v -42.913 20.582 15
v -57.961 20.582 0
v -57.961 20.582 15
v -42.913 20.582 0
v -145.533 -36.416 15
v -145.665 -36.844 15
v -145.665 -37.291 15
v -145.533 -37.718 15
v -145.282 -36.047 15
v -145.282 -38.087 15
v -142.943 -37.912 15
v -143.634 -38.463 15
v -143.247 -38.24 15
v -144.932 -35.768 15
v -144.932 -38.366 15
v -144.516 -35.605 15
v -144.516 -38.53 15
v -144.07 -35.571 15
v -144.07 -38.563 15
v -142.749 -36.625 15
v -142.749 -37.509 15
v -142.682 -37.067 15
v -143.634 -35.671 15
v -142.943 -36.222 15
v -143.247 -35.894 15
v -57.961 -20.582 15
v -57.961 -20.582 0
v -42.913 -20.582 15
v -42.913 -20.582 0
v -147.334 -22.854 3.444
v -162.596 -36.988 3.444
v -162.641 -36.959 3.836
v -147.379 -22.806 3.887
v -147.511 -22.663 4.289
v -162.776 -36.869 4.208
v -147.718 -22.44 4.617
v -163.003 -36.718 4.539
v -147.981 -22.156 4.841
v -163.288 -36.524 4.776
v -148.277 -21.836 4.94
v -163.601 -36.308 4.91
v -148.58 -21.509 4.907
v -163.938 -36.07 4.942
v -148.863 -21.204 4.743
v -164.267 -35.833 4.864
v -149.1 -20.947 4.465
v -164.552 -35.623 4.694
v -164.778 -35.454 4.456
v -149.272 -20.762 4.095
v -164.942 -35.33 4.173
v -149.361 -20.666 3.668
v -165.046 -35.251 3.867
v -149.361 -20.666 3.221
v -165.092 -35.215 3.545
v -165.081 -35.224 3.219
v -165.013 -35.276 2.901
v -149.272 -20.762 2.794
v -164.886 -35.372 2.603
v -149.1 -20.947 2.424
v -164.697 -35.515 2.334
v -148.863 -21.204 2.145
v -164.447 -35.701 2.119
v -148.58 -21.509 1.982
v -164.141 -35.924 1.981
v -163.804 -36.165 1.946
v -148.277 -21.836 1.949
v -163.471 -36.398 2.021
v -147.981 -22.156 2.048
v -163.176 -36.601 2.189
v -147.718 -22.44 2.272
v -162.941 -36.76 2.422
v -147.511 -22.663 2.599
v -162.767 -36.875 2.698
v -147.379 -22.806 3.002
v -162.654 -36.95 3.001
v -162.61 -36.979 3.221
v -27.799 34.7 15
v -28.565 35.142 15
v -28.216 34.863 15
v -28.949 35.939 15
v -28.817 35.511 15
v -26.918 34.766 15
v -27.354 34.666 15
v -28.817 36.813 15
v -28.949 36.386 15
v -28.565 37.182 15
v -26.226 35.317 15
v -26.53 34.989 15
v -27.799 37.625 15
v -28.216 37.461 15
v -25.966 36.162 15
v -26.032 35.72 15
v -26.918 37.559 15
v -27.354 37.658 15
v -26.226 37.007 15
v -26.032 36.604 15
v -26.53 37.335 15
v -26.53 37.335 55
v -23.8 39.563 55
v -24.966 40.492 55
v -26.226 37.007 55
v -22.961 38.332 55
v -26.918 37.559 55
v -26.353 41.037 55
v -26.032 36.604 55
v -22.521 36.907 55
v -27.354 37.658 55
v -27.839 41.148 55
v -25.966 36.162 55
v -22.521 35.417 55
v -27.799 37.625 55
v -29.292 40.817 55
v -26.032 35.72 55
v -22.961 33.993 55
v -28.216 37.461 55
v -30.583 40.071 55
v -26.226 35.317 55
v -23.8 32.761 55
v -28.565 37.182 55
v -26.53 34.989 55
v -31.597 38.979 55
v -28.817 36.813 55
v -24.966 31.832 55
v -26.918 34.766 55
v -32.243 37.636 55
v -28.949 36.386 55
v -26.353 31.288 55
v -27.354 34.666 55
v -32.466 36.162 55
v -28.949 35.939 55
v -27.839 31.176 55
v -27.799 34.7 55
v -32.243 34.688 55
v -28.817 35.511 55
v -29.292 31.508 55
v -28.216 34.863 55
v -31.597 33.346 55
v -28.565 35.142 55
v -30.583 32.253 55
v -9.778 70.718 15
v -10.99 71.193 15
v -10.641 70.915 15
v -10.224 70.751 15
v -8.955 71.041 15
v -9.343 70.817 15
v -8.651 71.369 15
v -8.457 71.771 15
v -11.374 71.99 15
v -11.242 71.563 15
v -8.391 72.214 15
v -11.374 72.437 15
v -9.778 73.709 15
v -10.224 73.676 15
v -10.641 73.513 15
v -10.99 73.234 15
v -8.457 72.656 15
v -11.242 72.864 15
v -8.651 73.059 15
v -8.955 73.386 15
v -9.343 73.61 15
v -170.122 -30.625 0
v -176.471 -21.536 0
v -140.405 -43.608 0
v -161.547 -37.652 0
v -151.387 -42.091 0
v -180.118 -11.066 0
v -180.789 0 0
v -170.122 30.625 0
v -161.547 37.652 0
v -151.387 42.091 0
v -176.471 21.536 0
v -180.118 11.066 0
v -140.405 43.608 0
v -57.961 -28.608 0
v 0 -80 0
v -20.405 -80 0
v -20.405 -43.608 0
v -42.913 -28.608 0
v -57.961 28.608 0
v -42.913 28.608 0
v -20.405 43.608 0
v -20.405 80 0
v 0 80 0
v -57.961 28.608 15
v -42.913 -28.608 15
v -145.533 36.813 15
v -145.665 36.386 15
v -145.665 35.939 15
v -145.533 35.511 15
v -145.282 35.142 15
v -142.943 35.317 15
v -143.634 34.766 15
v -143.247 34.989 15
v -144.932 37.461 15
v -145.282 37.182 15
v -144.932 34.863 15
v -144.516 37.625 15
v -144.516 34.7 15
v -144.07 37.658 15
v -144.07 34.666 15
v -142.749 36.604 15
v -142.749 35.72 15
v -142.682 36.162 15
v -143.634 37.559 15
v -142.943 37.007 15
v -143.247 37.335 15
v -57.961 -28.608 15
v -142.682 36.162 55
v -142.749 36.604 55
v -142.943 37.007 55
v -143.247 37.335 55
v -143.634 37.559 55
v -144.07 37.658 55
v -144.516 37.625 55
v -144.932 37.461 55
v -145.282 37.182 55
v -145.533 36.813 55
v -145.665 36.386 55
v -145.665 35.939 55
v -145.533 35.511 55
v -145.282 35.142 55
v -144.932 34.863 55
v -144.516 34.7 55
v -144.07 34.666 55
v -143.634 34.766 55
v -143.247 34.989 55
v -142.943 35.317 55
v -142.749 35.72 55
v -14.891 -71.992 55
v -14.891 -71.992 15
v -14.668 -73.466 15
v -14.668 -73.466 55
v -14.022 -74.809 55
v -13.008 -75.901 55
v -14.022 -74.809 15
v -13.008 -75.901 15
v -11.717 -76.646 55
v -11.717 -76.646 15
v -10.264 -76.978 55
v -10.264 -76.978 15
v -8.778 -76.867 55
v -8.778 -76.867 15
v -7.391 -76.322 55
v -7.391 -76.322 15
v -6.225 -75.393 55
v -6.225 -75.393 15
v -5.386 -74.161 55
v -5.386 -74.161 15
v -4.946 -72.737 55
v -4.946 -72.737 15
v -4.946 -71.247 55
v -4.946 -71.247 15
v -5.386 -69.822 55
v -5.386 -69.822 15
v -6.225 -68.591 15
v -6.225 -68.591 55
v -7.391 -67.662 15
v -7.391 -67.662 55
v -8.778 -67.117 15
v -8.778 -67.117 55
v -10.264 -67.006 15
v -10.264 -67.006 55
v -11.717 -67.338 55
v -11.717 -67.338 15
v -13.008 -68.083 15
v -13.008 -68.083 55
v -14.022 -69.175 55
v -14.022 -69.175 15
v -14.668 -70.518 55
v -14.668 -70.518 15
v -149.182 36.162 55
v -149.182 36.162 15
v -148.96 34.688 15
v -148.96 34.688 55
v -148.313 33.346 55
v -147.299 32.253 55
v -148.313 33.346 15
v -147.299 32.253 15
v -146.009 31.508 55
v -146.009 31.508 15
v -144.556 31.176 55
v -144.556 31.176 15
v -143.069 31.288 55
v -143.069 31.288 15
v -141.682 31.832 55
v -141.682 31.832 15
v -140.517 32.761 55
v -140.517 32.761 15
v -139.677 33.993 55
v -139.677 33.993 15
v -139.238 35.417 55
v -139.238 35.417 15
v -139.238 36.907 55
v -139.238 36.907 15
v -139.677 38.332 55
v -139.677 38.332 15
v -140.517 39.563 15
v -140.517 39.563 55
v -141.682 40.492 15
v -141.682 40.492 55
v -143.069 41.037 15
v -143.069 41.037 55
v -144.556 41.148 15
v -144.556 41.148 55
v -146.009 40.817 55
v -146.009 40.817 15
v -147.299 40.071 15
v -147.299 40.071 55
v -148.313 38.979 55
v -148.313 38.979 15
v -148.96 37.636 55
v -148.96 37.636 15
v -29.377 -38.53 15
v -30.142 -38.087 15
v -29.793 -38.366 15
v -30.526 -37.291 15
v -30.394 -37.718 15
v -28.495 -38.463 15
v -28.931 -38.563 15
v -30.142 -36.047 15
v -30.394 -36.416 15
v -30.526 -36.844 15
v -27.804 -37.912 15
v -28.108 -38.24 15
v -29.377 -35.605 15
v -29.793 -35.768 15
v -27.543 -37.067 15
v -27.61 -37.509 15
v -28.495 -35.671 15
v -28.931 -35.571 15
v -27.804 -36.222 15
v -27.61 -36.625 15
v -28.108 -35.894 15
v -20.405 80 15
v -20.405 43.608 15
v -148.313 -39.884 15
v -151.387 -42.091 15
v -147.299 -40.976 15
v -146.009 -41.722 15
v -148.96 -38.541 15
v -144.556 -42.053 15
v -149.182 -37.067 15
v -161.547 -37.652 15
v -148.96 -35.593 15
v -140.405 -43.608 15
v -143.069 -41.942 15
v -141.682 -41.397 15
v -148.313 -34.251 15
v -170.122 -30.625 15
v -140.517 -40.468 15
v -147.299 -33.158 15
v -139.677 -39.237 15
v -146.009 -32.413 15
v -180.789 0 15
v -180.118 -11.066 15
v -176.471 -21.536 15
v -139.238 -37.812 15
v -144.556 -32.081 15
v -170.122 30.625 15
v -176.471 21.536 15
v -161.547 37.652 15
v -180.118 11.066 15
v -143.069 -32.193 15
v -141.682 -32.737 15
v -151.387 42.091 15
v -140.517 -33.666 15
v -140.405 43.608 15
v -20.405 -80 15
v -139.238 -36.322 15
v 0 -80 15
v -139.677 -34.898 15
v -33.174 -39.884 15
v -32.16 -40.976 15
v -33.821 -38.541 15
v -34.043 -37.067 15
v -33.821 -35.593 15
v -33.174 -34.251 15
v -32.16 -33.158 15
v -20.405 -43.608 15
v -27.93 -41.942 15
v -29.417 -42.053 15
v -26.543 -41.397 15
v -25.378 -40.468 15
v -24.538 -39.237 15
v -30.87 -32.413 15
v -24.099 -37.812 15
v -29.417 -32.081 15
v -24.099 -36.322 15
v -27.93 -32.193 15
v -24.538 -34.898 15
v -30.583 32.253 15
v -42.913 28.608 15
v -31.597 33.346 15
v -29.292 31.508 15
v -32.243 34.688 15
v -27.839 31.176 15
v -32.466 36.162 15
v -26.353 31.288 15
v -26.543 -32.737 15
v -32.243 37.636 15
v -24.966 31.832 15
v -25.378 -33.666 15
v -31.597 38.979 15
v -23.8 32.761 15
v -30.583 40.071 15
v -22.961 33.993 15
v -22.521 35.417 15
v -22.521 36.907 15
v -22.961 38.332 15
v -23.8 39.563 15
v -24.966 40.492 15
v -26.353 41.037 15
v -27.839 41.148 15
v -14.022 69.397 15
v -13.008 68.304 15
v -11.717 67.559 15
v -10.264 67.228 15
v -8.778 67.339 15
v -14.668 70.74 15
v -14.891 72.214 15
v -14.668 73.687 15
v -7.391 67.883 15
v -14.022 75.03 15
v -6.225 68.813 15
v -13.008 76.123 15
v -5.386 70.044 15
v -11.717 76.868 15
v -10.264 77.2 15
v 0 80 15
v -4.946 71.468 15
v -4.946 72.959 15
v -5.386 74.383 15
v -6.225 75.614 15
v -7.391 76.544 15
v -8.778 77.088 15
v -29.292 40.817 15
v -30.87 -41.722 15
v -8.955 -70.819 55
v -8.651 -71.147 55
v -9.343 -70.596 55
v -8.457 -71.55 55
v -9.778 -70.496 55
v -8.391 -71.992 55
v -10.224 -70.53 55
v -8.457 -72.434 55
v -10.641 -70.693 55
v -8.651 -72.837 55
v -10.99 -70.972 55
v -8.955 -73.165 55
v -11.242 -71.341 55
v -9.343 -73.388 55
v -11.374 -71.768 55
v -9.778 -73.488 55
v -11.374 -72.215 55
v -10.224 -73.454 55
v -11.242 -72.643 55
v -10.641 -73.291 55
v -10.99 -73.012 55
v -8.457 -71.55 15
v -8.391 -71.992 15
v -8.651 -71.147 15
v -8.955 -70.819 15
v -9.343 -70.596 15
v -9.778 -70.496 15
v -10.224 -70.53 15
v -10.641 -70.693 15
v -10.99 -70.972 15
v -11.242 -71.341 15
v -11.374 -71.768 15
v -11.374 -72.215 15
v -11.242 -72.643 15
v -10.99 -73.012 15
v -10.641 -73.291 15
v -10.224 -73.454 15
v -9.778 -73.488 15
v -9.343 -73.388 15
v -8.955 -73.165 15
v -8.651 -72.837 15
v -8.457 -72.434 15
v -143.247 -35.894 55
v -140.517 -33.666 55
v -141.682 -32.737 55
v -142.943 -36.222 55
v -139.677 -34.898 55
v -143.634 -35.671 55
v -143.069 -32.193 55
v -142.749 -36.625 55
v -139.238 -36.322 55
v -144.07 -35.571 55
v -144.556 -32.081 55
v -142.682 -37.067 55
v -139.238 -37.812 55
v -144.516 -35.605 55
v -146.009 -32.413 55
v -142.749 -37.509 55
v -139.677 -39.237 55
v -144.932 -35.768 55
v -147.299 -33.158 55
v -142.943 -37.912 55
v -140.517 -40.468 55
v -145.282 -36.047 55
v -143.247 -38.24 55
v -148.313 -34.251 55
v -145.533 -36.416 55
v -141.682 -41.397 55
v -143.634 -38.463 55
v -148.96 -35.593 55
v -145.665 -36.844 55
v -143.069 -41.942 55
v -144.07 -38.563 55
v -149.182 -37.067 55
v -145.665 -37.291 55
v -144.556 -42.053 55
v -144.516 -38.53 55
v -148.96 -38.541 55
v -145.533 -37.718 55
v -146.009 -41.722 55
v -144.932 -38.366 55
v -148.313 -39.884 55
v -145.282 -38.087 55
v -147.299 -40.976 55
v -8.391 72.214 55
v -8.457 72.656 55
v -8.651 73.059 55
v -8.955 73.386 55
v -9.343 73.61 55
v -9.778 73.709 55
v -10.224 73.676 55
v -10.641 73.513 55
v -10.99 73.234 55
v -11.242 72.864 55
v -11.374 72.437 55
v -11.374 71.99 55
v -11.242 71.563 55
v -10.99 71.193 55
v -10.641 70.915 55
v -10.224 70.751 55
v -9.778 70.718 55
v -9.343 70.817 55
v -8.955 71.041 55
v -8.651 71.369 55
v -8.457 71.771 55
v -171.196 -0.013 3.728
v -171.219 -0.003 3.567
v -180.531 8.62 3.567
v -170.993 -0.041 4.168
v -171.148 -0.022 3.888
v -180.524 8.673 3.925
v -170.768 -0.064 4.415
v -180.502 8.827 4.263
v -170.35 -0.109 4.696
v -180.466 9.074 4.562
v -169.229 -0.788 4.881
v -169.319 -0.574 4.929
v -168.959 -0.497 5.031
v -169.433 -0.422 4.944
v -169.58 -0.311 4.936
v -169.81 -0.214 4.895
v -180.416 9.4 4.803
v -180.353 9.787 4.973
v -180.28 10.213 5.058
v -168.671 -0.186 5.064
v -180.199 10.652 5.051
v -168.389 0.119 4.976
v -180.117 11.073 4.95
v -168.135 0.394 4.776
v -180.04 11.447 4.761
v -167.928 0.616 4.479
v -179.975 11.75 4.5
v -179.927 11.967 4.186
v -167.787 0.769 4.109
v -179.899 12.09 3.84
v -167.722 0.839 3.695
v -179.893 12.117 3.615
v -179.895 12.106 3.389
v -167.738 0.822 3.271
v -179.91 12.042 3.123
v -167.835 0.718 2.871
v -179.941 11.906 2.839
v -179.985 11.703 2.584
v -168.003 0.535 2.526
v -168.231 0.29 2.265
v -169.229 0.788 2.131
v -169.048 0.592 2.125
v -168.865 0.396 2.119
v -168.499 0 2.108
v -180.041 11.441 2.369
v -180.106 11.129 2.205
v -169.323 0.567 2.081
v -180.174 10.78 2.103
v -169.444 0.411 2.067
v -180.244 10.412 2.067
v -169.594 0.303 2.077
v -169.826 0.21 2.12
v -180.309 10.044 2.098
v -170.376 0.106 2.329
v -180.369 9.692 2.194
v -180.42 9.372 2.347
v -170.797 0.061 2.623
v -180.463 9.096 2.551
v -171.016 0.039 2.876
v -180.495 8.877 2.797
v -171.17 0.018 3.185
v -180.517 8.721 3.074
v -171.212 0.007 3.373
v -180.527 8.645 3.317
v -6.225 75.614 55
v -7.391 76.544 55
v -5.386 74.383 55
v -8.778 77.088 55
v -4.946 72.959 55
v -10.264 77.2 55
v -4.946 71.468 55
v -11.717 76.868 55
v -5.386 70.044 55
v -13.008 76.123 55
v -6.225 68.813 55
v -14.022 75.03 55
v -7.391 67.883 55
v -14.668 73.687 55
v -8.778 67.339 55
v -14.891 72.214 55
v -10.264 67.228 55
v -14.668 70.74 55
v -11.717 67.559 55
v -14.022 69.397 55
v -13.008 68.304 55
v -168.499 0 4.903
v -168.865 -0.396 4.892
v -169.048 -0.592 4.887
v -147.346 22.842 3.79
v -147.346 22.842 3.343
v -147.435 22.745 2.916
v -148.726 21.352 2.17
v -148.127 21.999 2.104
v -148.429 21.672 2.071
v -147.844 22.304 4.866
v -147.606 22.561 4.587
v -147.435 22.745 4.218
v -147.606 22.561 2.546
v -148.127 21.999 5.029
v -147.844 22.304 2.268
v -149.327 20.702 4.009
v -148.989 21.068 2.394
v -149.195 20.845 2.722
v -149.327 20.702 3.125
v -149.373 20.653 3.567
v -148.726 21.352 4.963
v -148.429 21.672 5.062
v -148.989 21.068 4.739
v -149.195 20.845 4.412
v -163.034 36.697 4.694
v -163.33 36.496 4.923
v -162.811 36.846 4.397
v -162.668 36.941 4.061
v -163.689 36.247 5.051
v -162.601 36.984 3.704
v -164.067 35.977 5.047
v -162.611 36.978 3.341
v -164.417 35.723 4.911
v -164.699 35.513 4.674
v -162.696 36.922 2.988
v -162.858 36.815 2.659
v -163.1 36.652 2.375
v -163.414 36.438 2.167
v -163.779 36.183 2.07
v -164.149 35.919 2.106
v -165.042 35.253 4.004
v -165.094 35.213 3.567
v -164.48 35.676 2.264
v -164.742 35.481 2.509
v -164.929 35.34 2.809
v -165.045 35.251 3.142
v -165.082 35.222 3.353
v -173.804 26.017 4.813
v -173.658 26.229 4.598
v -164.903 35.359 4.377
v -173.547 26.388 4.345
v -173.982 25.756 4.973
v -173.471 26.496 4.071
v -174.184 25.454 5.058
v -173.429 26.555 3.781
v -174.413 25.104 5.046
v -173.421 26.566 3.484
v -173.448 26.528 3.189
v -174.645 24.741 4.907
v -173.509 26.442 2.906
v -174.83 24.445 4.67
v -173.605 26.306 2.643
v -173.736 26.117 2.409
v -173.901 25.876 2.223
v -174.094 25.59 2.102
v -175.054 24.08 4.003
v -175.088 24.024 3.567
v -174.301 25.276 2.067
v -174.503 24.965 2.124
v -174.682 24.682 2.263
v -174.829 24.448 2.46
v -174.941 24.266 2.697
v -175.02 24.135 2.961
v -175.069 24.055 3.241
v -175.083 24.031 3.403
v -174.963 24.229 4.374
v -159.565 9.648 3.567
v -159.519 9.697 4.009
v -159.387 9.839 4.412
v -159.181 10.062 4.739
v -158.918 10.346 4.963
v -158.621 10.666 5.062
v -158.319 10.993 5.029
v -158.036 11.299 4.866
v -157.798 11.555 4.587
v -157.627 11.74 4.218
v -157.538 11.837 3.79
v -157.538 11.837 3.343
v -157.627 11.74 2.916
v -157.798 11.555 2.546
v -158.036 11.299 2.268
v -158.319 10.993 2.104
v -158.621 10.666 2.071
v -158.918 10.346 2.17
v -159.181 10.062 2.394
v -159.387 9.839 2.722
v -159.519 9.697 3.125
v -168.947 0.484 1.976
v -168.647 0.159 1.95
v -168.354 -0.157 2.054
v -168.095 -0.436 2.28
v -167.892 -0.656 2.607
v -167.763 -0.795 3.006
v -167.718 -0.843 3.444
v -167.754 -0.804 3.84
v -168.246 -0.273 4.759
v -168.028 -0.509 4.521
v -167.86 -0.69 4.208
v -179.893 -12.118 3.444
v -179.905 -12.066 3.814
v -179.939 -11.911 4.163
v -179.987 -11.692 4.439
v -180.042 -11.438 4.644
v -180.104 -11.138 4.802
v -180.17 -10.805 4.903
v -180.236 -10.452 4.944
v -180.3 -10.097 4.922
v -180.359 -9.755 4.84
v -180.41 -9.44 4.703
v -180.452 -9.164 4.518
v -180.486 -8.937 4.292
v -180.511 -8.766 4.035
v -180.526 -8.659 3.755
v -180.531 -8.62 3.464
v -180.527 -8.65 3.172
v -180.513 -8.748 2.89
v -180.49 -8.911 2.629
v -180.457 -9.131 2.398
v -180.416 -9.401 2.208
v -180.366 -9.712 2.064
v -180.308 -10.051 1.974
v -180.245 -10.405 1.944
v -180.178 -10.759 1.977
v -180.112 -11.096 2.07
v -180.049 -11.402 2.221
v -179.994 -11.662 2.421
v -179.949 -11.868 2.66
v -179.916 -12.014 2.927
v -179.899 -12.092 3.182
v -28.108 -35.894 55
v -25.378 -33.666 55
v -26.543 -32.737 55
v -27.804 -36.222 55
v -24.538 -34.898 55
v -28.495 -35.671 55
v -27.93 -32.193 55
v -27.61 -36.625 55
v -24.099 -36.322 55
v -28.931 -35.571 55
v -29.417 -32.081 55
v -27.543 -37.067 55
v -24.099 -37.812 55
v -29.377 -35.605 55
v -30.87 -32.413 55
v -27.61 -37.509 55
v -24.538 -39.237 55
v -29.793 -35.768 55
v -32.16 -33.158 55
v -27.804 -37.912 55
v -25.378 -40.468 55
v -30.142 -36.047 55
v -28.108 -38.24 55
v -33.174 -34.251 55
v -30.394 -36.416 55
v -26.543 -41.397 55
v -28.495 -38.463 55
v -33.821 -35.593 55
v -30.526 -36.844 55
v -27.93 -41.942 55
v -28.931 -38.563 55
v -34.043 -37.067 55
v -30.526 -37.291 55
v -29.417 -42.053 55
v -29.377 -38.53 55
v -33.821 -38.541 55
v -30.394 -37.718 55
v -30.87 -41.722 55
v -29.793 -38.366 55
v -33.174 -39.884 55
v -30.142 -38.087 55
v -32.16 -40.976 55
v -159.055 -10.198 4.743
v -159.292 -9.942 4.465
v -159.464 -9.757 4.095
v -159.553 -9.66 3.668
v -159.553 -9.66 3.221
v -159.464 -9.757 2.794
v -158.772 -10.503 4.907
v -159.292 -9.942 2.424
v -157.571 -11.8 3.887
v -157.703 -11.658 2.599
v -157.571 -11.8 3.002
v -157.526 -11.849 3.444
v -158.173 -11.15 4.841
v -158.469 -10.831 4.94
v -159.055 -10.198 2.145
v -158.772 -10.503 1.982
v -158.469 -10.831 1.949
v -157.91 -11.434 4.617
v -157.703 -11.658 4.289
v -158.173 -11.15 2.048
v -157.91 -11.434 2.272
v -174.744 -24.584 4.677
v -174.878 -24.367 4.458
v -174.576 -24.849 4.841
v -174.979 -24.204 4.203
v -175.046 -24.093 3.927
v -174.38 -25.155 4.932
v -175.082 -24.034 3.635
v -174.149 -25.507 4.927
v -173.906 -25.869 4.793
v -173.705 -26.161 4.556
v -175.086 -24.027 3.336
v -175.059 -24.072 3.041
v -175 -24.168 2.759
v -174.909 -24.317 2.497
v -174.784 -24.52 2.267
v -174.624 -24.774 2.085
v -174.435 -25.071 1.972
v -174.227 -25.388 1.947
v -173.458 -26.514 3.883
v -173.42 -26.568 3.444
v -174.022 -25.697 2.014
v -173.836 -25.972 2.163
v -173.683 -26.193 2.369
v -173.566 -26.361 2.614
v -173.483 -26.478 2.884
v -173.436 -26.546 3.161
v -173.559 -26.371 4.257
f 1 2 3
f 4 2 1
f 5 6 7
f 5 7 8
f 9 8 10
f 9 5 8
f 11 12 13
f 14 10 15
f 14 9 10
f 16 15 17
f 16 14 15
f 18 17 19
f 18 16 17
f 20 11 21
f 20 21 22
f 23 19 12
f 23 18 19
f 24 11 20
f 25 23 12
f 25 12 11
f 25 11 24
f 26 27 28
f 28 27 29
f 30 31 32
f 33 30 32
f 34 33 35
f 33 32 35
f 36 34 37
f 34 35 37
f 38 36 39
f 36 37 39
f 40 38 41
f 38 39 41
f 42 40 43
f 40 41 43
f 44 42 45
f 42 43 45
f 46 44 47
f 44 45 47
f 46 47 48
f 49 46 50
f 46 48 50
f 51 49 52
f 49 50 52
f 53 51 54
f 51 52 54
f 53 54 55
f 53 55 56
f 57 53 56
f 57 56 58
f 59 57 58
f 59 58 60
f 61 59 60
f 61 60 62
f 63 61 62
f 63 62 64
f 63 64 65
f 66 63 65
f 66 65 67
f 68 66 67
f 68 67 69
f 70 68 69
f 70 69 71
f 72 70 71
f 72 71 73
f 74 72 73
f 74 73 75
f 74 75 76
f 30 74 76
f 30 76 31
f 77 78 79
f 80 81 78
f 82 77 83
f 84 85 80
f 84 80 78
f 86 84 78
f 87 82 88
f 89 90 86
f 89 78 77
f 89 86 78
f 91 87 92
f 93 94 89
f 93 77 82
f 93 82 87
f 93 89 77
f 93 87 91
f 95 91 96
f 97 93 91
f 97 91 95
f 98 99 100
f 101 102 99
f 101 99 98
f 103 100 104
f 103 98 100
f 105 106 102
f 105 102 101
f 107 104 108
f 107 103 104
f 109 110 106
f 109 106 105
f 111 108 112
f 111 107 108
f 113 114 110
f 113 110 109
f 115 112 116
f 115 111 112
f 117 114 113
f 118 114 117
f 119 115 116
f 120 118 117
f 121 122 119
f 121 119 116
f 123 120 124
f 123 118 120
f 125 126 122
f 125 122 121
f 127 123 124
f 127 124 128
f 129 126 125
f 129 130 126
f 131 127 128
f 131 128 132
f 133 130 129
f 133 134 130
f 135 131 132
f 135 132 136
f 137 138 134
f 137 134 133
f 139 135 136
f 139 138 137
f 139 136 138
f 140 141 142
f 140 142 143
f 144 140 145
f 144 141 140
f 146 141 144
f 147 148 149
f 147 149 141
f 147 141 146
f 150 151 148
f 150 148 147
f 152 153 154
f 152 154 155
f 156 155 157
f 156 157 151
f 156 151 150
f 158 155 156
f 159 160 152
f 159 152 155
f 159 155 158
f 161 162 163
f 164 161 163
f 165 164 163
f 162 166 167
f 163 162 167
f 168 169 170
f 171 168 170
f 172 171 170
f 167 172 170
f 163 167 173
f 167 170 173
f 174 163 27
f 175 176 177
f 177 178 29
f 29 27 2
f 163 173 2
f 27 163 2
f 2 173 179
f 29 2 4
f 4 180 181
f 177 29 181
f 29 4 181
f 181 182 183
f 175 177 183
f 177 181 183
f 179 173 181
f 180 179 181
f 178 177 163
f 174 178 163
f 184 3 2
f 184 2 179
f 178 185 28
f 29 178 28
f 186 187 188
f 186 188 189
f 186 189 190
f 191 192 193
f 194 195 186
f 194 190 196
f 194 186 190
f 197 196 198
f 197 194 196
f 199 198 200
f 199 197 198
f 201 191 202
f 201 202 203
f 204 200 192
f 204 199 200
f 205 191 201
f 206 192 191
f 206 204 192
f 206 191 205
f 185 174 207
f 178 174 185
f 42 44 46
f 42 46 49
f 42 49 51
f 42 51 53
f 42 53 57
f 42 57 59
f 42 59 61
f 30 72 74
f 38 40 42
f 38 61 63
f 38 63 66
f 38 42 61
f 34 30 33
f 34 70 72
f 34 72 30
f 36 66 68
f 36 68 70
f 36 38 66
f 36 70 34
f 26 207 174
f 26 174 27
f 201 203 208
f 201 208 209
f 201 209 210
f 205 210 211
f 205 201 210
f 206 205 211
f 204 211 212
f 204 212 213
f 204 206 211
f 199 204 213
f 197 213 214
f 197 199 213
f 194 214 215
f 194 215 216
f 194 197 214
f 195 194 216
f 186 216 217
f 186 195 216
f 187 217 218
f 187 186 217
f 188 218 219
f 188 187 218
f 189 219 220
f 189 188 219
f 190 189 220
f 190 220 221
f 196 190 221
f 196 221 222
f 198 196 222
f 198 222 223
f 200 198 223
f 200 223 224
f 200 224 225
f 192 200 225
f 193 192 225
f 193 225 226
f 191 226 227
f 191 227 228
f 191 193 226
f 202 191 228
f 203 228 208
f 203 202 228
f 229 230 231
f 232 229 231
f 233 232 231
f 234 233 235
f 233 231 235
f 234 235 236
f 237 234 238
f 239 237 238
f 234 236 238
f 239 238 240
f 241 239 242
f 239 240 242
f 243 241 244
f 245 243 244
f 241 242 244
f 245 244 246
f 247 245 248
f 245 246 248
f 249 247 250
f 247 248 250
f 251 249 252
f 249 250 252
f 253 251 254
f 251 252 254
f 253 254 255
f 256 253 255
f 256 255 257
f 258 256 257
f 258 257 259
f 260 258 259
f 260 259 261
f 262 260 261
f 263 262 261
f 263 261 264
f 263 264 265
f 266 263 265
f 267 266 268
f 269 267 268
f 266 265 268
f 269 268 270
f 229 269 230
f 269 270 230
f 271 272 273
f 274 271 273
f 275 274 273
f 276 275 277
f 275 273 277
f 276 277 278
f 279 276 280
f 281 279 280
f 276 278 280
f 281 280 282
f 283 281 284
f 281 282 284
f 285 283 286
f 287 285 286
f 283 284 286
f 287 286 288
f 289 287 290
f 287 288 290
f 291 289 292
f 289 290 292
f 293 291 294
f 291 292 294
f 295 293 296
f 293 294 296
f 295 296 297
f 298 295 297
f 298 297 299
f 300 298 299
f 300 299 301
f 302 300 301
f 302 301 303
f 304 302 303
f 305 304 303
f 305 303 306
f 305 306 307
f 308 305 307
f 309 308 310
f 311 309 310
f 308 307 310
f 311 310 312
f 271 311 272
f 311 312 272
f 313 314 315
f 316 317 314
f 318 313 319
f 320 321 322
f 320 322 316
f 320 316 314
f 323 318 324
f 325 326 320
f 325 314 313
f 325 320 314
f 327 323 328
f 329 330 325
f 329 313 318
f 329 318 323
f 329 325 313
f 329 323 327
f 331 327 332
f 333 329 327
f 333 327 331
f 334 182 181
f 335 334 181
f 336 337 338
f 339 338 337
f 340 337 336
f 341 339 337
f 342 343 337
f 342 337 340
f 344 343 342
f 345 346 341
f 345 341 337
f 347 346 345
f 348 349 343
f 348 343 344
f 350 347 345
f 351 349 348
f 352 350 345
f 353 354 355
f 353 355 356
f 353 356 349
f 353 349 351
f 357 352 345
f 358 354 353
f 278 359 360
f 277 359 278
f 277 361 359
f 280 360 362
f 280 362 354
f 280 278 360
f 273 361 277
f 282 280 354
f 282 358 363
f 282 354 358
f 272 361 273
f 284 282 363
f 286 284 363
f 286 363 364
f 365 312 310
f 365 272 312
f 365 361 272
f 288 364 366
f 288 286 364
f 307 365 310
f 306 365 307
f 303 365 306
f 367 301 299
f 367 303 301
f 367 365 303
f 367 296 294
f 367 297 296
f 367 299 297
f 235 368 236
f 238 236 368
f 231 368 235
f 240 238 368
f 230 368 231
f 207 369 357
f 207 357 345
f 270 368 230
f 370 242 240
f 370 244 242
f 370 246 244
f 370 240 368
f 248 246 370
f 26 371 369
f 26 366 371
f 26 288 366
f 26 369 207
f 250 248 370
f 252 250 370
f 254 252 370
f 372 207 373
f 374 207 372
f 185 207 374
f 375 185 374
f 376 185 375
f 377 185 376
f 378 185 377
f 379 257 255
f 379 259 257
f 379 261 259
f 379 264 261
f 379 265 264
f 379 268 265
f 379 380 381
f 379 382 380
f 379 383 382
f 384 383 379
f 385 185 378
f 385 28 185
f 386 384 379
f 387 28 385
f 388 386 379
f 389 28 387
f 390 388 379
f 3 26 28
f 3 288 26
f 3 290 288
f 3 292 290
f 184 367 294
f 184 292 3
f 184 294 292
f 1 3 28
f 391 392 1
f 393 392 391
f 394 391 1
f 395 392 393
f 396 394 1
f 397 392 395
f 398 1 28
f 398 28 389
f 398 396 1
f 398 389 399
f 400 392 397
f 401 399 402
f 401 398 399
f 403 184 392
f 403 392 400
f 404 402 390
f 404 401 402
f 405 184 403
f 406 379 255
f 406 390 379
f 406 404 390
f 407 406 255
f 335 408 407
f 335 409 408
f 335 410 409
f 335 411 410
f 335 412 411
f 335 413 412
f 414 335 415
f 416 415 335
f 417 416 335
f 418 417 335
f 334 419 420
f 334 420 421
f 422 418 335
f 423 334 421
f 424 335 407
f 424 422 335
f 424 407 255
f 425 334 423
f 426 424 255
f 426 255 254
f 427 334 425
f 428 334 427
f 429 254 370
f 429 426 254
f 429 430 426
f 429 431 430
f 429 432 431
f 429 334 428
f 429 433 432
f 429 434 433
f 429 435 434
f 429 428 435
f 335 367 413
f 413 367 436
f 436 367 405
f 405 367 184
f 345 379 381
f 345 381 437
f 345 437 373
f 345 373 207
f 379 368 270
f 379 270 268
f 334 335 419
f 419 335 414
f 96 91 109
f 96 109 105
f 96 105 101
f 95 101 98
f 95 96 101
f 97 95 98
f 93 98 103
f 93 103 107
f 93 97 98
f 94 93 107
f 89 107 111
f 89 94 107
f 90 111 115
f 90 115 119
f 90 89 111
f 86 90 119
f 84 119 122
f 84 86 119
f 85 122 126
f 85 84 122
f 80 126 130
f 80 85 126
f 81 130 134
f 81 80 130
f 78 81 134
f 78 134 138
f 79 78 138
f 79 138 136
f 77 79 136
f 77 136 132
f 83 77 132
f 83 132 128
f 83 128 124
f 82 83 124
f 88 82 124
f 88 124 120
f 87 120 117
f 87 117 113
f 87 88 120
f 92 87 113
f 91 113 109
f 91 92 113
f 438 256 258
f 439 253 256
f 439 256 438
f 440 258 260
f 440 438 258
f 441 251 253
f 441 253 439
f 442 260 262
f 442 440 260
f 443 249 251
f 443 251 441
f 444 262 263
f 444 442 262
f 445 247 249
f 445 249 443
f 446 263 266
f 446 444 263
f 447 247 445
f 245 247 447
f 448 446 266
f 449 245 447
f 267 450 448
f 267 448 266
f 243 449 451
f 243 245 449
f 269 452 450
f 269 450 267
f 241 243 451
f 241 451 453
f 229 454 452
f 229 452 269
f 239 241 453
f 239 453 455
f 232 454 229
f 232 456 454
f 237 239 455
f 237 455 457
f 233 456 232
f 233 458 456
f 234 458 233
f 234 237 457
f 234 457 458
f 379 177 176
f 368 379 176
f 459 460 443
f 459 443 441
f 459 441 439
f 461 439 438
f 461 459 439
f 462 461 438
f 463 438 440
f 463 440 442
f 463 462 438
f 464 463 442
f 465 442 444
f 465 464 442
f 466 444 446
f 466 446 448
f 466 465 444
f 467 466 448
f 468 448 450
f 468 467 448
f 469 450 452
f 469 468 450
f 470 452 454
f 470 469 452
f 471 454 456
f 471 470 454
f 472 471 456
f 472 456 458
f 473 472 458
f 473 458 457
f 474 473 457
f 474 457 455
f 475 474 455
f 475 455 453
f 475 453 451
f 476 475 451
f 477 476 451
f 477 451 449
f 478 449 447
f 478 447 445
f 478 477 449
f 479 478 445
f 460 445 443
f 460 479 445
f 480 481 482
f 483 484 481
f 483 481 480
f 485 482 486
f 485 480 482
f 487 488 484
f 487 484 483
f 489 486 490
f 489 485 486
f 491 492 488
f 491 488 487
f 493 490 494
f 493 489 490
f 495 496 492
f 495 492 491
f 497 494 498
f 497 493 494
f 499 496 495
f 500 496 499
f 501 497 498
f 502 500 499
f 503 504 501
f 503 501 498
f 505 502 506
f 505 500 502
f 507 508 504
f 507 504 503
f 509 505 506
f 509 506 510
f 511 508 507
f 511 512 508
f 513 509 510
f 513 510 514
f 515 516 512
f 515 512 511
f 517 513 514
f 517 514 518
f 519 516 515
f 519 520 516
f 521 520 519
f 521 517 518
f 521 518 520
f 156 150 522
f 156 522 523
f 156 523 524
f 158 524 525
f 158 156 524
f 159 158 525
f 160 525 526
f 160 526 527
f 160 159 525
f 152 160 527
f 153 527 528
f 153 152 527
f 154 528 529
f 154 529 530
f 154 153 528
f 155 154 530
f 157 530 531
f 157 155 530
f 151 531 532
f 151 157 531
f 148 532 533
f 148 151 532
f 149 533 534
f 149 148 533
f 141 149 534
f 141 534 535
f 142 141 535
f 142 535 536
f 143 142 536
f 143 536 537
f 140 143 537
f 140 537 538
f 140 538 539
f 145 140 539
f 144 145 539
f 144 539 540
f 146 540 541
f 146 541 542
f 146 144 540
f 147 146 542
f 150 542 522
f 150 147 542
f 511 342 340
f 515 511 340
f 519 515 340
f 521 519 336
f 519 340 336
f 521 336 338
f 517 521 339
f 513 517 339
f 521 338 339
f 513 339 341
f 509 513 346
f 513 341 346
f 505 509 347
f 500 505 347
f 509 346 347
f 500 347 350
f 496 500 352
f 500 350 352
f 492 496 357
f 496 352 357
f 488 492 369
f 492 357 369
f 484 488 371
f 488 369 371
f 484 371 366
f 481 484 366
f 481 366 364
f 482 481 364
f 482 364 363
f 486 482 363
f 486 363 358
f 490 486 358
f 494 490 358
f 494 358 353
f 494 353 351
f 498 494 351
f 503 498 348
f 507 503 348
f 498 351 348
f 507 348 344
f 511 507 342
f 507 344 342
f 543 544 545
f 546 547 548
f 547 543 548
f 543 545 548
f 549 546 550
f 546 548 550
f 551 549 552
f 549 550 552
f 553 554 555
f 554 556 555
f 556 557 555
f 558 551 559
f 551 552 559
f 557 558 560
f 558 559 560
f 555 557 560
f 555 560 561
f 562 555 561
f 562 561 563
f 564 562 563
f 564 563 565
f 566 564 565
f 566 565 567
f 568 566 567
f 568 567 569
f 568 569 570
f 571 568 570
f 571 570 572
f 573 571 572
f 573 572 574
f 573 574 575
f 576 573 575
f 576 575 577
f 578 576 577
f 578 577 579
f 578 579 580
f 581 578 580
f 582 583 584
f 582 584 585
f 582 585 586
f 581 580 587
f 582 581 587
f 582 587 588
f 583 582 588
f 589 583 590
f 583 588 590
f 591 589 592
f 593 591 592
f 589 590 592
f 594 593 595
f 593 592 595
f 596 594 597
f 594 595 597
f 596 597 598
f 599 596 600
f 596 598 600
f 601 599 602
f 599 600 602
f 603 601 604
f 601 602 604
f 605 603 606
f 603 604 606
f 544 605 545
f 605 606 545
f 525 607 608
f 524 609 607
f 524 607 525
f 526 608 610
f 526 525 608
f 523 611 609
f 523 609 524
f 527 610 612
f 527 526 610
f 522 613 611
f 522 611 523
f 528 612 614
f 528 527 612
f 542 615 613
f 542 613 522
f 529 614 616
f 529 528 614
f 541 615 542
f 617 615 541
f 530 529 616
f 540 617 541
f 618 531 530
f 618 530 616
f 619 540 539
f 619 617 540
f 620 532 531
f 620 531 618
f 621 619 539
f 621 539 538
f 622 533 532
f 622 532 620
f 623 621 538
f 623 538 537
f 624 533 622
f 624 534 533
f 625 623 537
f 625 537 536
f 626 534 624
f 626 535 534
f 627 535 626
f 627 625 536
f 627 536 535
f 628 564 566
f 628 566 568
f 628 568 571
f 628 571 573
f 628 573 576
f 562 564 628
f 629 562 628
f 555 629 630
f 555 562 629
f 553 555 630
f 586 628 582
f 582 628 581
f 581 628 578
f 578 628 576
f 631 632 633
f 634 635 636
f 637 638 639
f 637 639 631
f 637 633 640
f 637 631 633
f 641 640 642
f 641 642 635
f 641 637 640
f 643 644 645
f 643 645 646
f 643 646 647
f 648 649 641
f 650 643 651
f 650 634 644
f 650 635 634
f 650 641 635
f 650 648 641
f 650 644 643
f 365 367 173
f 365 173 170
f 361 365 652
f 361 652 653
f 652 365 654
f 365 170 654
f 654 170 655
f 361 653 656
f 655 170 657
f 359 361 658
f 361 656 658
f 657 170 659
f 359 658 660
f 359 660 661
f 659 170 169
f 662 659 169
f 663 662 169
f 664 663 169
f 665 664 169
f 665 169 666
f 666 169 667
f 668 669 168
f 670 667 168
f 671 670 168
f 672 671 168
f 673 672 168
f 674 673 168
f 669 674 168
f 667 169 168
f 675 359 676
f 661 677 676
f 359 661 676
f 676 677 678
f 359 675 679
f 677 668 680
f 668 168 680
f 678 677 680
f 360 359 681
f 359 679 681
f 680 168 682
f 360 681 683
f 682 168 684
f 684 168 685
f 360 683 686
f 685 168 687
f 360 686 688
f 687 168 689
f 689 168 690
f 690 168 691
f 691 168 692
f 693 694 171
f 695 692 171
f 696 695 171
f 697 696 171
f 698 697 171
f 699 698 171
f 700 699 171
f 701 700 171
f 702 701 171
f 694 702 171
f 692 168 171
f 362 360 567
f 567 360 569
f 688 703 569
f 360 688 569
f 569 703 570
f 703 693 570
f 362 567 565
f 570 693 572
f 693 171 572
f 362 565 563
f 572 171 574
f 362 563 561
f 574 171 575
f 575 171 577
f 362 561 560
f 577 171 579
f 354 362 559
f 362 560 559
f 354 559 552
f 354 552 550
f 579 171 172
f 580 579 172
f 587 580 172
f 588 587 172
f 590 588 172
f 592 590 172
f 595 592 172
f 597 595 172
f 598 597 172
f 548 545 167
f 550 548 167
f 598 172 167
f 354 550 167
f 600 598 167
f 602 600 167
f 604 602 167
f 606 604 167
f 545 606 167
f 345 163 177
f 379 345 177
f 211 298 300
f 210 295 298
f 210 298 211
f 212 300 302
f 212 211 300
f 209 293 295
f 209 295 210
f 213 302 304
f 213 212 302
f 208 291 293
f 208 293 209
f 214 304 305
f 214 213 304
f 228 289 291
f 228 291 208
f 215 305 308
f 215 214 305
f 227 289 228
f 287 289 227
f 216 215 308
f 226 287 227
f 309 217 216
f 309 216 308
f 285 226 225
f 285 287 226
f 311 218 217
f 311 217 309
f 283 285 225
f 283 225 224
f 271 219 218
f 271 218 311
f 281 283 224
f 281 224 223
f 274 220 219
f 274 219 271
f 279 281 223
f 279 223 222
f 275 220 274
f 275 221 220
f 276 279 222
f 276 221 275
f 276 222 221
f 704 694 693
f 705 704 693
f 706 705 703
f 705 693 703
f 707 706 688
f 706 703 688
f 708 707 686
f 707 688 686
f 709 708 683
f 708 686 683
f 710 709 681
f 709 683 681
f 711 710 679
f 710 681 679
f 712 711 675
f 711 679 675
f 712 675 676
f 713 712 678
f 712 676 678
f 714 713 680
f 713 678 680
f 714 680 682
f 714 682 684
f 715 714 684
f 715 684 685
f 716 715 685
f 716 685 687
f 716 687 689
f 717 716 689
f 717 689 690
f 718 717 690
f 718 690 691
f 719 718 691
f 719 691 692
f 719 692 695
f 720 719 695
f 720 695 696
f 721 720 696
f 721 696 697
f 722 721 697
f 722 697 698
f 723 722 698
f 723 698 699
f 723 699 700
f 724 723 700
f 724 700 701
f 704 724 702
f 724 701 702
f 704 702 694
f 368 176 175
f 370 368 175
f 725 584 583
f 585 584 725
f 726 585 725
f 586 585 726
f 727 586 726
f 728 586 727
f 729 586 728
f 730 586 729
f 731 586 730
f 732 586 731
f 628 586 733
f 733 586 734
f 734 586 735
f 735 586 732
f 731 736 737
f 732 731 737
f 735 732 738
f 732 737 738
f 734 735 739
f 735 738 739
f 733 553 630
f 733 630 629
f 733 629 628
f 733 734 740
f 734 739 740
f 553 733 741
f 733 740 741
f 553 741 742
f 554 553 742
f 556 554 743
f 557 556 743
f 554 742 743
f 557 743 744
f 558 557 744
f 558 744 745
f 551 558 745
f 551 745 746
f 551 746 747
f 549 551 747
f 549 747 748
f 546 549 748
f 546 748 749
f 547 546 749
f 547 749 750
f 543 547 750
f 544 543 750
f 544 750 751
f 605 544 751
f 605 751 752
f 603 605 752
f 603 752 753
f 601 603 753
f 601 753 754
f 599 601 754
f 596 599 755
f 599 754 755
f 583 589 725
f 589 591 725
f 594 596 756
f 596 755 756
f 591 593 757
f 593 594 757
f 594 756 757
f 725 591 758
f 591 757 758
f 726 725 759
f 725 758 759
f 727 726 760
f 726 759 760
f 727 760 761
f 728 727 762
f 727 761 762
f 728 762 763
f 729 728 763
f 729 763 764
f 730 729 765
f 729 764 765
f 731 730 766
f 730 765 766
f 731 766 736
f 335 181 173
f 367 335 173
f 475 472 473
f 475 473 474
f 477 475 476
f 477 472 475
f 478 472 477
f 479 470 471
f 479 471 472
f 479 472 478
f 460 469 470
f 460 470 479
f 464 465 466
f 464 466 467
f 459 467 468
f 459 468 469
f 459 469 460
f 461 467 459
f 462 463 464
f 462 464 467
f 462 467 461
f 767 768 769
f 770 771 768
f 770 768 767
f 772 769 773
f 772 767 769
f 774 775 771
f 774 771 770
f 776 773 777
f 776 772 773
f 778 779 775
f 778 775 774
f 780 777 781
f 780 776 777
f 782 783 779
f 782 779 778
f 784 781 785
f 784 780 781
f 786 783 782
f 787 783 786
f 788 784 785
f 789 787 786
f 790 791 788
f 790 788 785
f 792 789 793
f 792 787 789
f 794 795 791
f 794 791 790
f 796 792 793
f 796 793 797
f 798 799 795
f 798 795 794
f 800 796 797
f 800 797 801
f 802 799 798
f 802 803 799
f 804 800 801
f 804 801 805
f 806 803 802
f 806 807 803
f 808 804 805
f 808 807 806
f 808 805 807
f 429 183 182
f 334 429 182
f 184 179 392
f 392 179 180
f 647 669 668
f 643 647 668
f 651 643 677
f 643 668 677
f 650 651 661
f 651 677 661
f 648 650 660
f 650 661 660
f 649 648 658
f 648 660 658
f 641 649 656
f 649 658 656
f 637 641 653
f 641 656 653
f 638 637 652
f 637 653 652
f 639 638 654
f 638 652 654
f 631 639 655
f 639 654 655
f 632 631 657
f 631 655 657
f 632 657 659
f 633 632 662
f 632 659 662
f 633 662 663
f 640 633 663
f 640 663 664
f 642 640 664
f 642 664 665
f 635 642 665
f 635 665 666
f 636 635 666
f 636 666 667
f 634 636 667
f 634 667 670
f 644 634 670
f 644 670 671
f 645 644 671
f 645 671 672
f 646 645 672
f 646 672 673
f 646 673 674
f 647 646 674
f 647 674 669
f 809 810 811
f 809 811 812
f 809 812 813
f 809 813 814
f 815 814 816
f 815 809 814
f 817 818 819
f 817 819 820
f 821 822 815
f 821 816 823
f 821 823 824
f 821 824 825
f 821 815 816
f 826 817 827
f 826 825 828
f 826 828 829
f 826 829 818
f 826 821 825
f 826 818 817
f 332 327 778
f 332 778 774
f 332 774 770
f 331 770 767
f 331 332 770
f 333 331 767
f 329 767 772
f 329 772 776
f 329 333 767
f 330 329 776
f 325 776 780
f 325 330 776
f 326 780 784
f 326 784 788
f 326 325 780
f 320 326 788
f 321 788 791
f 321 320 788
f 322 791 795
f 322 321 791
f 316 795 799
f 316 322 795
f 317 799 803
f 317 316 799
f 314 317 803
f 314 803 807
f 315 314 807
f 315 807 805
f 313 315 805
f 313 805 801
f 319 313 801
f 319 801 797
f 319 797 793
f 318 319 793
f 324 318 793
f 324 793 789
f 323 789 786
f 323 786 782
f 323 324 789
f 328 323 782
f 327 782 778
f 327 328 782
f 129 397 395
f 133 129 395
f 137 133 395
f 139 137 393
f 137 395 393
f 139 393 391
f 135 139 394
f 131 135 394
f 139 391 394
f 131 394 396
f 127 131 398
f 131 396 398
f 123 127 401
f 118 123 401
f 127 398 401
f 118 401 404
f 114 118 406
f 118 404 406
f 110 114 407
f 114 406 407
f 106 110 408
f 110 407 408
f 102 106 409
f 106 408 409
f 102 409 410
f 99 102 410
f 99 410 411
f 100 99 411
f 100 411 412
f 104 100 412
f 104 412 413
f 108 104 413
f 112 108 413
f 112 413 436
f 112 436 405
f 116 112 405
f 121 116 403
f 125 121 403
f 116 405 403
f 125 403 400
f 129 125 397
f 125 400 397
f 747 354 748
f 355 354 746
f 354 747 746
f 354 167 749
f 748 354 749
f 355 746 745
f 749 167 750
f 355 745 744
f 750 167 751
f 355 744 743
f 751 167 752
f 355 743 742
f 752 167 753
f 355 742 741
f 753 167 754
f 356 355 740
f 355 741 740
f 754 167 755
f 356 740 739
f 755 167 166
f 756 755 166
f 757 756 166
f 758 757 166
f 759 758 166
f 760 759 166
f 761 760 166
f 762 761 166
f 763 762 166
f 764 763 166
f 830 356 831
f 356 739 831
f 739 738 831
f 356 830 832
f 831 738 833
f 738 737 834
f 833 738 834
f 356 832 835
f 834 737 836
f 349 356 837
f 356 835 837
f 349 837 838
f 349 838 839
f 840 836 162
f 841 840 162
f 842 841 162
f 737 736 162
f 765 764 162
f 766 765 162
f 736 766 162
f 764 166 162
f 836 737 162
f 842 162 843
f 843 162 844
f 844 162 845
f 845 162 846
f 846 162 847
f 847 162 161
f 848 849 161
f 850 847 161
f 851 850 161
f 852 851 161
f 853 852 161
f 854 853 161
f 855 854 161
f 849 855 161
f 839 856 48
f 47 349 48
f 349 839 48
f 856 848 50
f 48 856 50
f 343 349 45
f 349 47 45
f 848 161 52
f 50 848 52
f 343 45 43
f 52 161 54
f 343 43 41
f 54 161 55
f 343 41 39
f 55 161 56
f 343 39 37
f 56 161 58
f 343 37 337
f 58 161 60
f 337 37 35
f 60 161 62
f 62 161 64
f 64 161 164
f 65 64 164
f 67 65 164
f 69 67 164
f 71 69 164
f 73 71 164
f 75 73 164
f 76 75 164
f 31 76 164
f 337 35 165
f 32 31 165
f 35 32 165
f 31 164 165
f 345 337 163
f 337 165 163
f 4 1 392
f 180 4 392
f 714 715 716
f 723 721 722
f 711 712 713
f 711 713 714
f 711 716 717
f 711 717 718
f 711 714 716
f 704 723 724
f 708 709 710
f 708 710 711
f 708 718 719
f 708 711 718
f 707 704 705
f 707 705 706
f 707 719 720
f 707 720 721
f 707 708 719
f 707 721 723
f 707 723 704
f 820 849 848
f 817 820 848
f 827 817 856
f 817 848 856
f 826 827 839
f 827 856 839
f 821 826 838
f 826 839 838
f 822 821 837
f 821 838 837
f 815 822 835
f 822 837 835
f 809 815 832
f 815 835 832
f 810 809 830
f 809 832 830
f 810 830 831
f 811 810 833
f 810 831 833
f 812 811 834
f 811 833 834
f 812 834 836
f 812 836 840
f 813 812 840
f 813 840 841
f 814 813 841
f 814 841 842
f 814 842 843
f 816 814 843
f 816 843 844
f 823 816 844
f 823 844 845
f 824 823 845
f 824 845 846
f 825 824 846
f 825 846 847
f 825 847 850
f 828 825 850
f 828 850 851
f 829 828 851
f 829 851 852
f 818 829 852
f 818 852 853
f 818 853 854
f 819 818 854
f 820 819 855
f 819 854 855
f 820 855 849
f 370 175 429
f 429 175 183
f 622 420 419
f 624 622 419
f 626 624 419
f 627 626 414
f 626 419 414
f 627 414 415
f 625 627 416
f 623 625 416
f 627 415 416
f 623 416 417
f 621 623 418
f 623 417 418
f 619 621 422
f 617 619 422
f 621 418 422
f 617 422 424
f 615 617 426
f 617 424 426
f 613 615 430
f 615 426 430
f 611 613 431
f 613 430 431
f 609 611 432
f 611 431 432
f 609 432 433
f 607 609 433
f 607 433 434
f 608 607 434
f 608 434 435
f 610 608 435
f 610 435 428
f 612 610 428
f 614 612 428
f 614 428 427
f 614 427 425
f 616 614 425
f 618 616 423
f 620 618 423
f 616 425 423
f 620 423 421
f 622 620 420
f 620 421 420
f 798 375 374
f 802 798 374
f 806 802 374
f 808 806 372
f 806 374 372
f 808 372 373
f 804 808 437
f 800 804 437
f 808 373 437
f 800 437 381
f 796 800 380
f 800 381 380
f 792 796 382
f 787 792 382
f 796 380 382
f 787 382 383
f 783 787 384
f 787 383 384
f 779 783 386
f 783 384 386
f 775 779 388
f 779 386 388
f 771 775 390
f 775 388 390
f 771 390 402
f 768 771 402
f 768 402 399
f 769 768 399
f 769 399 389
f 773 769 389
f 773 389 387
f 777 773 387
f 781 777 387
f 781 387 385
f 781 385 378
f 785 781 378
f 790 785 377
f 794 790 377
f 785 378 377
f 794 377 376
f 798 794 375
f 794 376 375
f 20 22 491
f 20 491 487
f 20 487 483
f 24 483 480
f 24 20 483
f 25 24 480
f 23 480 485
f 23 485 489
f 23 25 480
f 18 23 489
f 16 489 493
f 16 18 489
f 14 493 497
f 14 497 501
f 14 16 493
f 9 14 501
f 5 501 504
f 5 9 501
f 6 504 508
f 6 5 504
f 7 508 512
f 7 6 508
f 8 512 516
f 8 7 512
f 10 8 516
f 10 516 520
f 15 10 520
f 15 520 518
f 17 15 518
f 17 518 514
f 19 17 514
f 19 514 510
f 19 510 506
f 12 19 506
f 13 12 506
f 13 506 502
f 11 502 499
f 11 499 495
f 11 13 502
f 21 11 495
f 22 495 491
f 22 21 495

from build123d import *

# Parameters (mm, degrees)
ESQUISSE1_W             = 15.04863884
ESQUISSE1_H             = 8.025940715
BOSS_EXTRU_2_DEPTH      = 15
ESQUISSE2_R             = 1.5
ENL_V_MAT_EXTRU_1_DEPTH = 22
ESQUISSE7_R             = 1.5
ENL_V_MAT_EXTRU_2_DEPTH = 22
ESQUISSE8_R             = 5
ESQUISSE8_R_2           = 1.5
BOSS_EXTRU_3_DEPTH      = 40


with BuildPart() as part:
    # Esquisse1 → Boss.-Extru.2 (new body)
    with BuildSketch(Plane.XY):
        with BuildLine():
            Line((-20.404811956, 60.852158428), (-20.404811956, 43.608028339))
            Line((-20.404811956, 43.608028339), (-140.404811956, 43.608028339))
            ThreePointArc((-140.404811956, 43.608028339), (-170.122450923, 30.625328971), (-180.789117416, 0))
            ThreePointArc((-180.789117416, 0), (-170.122450923, -30.625328971), (-140.404811956, -43.608028339))
            Line((-140.404811956, -43.608028339), (-20.404811956, -43.608028339))
            Line((-20.404811956, -43.608028339), (-20.404811956, -60.852158428))
            Line((-20.404811956, -60.852158428), (-20.404811956, -80))
            Line((-20.404811956, -80), (0, -80))
            Line((0, -80), (0, 80))
            Line((0, 80), (-20.404811956, 80))
            Line((-20.404811956, 80), (-20.404811956, 60.852158428))
        make_face()
        with Locations((-50.437129359, 24.595057981)):
            Rectangle(ESQUISSE1_W, ESQUISSE1_H, mode=Mode.SUBTRACT)
        with Locations((-50.437129359, -24.595057981)):
            Rectangle(ESQUISSE1_W, ESQUISSE1_H, mode=Mode.SUBTRACT)
    extrude(amount=BOSS_EXTRU_2_DEPTH)

    # Esquisse2 → Enlèv. mat.-Extru.1 (cut)
    with BuildSketch(Plane(origin=(-170.122450923, 30.625328971, 0), x_dir=(0, 0, 1), z_dir=(-0.7337061397658711, 0.6794669237496878, 0))):
        with Locations(Location((3.566685756, 8.282361033, 0), (0, 0, 270))):
            Circle(ESQUISSE2_R)
        with Locations(Location((3.566685756, -21.717638967, 0), (0, 0, 270))):
            Circle(ESQUISSE2_R)
        with Locations(Location((3.566685756, -6.717638967, 0), (0, 0, 270))):
            Circle(ESQUISSE2_R)
    extrude(amount=-ENL_V_MAT_EXTRU_1_DEPTH, mode=Mode.SUBTRACT)

    # Esquisse7 → Enlèv. mat.-Extru.2 (cut)
    with BuildSketch(Plane(origin=(-170.122450923, -30.625328971, 15), x_dir=(0, 0, 1), z_dir=(-0.7337061397658707, -0.6794669237496883, 0))):
        with Locations(Location((-11.555586861, 21.717638967, 0), (0, 0, 270))):
            Circle(ESQUISSE7_R)
        with Locations(Location((-11.555586861, -8.282361033, 0), (0, 0, 270))):
            Circle(ESQUISSE7_R)
        with Locations(Location((-11.555586861, 6.717638967, 0), (0, 0, 270))):
            Circle(ESQUISSE7_R)
    extrude(amount=-ENL_V_MAT_EXTRU_2_DEPTH, mode=Mode.SUBTRACT)

    # Esquisse8 → Boss.-Extru.3 (add)
    # profile 1 of 6: a face of its own
    with BuildSketch(Plane.XY.offset(15)):
        with Locations(Location((-9.890580264, 72.213588888, 0), (0, 0, 180))):
            Circle(ESQUISSE8_R)
        with Locations((-9.890580264, 72.213588888)):
            Circle(ESQUISSE8_R_2, mode=Mode.SUBTRACT)
    # profile 2 of 6: a face of its own
    with BuildSketch(Plane.XY.offset(15)):
        with Locations(Location((-9.890580264, -71.991912234, 0), (0, 0, 180))):
            Circle(ESQUISSE8_R)
        with Locations((-9.890580264, -71.991912234)):
            Circle(ESQUISSE8_R_2, mode=Mode.SUBTRACT)
    # profile 3 of 6: a face of its own
    with BuildSketch(Plane.XY.offset(15)):
        with Locations(Location((-27.465625713, 36.162213608, 0), (0, 0, 180))):
            Circle(ESQUISSE8_R)
        with Locations((-27.465625713, 36.162213608)):
            Circle(ESQUISSE8_R_2, mode=Mode.SUBTRACT)
    # profile 4 of 6: a face of its own
    with BuildSketch(Plane.XY.offset(15)):
        with Locations(Location((-29.042873382, -37.067142431, 0), (0, 0, 180))):
            Circle(ESQUISSE8_R)
        with Locations((-29.042873382, -37.067142431)):
            Circle(ESQUISSE8_R_2, mode=Mode.SUBTRACT)
    # profile 5 of 6: a face of its own
    with BuildSketch(Plane.XY.offset(15)):
        with Locations(Location((-144.181953183, 36.162213608, 0), (0, 0, 180))):
            Circle(ESQUISSE8_R)
        with Locations((-144.181953183, 36.162213608)):
            Circle(ESQUISSE8_R_2, mode=Mode.SUBTRACT)
    # profile 6 of 6: a face of its own
    with BuildSketch(Plane.XY.offset(15)):
        with Locations(Location((-144.181953183, -37.067142431, 0), (0, 0, 180))):
            Circle(ESQUISSE8_R)
        with Locations((-144.181953183, -37.067142431)):
            Circle(ESQUISSE8_R_2, mode=Mode.SUBTRACT)
    extrude(amount=BOSS_EXTRU_3_DEPTH)


solid = part.part
